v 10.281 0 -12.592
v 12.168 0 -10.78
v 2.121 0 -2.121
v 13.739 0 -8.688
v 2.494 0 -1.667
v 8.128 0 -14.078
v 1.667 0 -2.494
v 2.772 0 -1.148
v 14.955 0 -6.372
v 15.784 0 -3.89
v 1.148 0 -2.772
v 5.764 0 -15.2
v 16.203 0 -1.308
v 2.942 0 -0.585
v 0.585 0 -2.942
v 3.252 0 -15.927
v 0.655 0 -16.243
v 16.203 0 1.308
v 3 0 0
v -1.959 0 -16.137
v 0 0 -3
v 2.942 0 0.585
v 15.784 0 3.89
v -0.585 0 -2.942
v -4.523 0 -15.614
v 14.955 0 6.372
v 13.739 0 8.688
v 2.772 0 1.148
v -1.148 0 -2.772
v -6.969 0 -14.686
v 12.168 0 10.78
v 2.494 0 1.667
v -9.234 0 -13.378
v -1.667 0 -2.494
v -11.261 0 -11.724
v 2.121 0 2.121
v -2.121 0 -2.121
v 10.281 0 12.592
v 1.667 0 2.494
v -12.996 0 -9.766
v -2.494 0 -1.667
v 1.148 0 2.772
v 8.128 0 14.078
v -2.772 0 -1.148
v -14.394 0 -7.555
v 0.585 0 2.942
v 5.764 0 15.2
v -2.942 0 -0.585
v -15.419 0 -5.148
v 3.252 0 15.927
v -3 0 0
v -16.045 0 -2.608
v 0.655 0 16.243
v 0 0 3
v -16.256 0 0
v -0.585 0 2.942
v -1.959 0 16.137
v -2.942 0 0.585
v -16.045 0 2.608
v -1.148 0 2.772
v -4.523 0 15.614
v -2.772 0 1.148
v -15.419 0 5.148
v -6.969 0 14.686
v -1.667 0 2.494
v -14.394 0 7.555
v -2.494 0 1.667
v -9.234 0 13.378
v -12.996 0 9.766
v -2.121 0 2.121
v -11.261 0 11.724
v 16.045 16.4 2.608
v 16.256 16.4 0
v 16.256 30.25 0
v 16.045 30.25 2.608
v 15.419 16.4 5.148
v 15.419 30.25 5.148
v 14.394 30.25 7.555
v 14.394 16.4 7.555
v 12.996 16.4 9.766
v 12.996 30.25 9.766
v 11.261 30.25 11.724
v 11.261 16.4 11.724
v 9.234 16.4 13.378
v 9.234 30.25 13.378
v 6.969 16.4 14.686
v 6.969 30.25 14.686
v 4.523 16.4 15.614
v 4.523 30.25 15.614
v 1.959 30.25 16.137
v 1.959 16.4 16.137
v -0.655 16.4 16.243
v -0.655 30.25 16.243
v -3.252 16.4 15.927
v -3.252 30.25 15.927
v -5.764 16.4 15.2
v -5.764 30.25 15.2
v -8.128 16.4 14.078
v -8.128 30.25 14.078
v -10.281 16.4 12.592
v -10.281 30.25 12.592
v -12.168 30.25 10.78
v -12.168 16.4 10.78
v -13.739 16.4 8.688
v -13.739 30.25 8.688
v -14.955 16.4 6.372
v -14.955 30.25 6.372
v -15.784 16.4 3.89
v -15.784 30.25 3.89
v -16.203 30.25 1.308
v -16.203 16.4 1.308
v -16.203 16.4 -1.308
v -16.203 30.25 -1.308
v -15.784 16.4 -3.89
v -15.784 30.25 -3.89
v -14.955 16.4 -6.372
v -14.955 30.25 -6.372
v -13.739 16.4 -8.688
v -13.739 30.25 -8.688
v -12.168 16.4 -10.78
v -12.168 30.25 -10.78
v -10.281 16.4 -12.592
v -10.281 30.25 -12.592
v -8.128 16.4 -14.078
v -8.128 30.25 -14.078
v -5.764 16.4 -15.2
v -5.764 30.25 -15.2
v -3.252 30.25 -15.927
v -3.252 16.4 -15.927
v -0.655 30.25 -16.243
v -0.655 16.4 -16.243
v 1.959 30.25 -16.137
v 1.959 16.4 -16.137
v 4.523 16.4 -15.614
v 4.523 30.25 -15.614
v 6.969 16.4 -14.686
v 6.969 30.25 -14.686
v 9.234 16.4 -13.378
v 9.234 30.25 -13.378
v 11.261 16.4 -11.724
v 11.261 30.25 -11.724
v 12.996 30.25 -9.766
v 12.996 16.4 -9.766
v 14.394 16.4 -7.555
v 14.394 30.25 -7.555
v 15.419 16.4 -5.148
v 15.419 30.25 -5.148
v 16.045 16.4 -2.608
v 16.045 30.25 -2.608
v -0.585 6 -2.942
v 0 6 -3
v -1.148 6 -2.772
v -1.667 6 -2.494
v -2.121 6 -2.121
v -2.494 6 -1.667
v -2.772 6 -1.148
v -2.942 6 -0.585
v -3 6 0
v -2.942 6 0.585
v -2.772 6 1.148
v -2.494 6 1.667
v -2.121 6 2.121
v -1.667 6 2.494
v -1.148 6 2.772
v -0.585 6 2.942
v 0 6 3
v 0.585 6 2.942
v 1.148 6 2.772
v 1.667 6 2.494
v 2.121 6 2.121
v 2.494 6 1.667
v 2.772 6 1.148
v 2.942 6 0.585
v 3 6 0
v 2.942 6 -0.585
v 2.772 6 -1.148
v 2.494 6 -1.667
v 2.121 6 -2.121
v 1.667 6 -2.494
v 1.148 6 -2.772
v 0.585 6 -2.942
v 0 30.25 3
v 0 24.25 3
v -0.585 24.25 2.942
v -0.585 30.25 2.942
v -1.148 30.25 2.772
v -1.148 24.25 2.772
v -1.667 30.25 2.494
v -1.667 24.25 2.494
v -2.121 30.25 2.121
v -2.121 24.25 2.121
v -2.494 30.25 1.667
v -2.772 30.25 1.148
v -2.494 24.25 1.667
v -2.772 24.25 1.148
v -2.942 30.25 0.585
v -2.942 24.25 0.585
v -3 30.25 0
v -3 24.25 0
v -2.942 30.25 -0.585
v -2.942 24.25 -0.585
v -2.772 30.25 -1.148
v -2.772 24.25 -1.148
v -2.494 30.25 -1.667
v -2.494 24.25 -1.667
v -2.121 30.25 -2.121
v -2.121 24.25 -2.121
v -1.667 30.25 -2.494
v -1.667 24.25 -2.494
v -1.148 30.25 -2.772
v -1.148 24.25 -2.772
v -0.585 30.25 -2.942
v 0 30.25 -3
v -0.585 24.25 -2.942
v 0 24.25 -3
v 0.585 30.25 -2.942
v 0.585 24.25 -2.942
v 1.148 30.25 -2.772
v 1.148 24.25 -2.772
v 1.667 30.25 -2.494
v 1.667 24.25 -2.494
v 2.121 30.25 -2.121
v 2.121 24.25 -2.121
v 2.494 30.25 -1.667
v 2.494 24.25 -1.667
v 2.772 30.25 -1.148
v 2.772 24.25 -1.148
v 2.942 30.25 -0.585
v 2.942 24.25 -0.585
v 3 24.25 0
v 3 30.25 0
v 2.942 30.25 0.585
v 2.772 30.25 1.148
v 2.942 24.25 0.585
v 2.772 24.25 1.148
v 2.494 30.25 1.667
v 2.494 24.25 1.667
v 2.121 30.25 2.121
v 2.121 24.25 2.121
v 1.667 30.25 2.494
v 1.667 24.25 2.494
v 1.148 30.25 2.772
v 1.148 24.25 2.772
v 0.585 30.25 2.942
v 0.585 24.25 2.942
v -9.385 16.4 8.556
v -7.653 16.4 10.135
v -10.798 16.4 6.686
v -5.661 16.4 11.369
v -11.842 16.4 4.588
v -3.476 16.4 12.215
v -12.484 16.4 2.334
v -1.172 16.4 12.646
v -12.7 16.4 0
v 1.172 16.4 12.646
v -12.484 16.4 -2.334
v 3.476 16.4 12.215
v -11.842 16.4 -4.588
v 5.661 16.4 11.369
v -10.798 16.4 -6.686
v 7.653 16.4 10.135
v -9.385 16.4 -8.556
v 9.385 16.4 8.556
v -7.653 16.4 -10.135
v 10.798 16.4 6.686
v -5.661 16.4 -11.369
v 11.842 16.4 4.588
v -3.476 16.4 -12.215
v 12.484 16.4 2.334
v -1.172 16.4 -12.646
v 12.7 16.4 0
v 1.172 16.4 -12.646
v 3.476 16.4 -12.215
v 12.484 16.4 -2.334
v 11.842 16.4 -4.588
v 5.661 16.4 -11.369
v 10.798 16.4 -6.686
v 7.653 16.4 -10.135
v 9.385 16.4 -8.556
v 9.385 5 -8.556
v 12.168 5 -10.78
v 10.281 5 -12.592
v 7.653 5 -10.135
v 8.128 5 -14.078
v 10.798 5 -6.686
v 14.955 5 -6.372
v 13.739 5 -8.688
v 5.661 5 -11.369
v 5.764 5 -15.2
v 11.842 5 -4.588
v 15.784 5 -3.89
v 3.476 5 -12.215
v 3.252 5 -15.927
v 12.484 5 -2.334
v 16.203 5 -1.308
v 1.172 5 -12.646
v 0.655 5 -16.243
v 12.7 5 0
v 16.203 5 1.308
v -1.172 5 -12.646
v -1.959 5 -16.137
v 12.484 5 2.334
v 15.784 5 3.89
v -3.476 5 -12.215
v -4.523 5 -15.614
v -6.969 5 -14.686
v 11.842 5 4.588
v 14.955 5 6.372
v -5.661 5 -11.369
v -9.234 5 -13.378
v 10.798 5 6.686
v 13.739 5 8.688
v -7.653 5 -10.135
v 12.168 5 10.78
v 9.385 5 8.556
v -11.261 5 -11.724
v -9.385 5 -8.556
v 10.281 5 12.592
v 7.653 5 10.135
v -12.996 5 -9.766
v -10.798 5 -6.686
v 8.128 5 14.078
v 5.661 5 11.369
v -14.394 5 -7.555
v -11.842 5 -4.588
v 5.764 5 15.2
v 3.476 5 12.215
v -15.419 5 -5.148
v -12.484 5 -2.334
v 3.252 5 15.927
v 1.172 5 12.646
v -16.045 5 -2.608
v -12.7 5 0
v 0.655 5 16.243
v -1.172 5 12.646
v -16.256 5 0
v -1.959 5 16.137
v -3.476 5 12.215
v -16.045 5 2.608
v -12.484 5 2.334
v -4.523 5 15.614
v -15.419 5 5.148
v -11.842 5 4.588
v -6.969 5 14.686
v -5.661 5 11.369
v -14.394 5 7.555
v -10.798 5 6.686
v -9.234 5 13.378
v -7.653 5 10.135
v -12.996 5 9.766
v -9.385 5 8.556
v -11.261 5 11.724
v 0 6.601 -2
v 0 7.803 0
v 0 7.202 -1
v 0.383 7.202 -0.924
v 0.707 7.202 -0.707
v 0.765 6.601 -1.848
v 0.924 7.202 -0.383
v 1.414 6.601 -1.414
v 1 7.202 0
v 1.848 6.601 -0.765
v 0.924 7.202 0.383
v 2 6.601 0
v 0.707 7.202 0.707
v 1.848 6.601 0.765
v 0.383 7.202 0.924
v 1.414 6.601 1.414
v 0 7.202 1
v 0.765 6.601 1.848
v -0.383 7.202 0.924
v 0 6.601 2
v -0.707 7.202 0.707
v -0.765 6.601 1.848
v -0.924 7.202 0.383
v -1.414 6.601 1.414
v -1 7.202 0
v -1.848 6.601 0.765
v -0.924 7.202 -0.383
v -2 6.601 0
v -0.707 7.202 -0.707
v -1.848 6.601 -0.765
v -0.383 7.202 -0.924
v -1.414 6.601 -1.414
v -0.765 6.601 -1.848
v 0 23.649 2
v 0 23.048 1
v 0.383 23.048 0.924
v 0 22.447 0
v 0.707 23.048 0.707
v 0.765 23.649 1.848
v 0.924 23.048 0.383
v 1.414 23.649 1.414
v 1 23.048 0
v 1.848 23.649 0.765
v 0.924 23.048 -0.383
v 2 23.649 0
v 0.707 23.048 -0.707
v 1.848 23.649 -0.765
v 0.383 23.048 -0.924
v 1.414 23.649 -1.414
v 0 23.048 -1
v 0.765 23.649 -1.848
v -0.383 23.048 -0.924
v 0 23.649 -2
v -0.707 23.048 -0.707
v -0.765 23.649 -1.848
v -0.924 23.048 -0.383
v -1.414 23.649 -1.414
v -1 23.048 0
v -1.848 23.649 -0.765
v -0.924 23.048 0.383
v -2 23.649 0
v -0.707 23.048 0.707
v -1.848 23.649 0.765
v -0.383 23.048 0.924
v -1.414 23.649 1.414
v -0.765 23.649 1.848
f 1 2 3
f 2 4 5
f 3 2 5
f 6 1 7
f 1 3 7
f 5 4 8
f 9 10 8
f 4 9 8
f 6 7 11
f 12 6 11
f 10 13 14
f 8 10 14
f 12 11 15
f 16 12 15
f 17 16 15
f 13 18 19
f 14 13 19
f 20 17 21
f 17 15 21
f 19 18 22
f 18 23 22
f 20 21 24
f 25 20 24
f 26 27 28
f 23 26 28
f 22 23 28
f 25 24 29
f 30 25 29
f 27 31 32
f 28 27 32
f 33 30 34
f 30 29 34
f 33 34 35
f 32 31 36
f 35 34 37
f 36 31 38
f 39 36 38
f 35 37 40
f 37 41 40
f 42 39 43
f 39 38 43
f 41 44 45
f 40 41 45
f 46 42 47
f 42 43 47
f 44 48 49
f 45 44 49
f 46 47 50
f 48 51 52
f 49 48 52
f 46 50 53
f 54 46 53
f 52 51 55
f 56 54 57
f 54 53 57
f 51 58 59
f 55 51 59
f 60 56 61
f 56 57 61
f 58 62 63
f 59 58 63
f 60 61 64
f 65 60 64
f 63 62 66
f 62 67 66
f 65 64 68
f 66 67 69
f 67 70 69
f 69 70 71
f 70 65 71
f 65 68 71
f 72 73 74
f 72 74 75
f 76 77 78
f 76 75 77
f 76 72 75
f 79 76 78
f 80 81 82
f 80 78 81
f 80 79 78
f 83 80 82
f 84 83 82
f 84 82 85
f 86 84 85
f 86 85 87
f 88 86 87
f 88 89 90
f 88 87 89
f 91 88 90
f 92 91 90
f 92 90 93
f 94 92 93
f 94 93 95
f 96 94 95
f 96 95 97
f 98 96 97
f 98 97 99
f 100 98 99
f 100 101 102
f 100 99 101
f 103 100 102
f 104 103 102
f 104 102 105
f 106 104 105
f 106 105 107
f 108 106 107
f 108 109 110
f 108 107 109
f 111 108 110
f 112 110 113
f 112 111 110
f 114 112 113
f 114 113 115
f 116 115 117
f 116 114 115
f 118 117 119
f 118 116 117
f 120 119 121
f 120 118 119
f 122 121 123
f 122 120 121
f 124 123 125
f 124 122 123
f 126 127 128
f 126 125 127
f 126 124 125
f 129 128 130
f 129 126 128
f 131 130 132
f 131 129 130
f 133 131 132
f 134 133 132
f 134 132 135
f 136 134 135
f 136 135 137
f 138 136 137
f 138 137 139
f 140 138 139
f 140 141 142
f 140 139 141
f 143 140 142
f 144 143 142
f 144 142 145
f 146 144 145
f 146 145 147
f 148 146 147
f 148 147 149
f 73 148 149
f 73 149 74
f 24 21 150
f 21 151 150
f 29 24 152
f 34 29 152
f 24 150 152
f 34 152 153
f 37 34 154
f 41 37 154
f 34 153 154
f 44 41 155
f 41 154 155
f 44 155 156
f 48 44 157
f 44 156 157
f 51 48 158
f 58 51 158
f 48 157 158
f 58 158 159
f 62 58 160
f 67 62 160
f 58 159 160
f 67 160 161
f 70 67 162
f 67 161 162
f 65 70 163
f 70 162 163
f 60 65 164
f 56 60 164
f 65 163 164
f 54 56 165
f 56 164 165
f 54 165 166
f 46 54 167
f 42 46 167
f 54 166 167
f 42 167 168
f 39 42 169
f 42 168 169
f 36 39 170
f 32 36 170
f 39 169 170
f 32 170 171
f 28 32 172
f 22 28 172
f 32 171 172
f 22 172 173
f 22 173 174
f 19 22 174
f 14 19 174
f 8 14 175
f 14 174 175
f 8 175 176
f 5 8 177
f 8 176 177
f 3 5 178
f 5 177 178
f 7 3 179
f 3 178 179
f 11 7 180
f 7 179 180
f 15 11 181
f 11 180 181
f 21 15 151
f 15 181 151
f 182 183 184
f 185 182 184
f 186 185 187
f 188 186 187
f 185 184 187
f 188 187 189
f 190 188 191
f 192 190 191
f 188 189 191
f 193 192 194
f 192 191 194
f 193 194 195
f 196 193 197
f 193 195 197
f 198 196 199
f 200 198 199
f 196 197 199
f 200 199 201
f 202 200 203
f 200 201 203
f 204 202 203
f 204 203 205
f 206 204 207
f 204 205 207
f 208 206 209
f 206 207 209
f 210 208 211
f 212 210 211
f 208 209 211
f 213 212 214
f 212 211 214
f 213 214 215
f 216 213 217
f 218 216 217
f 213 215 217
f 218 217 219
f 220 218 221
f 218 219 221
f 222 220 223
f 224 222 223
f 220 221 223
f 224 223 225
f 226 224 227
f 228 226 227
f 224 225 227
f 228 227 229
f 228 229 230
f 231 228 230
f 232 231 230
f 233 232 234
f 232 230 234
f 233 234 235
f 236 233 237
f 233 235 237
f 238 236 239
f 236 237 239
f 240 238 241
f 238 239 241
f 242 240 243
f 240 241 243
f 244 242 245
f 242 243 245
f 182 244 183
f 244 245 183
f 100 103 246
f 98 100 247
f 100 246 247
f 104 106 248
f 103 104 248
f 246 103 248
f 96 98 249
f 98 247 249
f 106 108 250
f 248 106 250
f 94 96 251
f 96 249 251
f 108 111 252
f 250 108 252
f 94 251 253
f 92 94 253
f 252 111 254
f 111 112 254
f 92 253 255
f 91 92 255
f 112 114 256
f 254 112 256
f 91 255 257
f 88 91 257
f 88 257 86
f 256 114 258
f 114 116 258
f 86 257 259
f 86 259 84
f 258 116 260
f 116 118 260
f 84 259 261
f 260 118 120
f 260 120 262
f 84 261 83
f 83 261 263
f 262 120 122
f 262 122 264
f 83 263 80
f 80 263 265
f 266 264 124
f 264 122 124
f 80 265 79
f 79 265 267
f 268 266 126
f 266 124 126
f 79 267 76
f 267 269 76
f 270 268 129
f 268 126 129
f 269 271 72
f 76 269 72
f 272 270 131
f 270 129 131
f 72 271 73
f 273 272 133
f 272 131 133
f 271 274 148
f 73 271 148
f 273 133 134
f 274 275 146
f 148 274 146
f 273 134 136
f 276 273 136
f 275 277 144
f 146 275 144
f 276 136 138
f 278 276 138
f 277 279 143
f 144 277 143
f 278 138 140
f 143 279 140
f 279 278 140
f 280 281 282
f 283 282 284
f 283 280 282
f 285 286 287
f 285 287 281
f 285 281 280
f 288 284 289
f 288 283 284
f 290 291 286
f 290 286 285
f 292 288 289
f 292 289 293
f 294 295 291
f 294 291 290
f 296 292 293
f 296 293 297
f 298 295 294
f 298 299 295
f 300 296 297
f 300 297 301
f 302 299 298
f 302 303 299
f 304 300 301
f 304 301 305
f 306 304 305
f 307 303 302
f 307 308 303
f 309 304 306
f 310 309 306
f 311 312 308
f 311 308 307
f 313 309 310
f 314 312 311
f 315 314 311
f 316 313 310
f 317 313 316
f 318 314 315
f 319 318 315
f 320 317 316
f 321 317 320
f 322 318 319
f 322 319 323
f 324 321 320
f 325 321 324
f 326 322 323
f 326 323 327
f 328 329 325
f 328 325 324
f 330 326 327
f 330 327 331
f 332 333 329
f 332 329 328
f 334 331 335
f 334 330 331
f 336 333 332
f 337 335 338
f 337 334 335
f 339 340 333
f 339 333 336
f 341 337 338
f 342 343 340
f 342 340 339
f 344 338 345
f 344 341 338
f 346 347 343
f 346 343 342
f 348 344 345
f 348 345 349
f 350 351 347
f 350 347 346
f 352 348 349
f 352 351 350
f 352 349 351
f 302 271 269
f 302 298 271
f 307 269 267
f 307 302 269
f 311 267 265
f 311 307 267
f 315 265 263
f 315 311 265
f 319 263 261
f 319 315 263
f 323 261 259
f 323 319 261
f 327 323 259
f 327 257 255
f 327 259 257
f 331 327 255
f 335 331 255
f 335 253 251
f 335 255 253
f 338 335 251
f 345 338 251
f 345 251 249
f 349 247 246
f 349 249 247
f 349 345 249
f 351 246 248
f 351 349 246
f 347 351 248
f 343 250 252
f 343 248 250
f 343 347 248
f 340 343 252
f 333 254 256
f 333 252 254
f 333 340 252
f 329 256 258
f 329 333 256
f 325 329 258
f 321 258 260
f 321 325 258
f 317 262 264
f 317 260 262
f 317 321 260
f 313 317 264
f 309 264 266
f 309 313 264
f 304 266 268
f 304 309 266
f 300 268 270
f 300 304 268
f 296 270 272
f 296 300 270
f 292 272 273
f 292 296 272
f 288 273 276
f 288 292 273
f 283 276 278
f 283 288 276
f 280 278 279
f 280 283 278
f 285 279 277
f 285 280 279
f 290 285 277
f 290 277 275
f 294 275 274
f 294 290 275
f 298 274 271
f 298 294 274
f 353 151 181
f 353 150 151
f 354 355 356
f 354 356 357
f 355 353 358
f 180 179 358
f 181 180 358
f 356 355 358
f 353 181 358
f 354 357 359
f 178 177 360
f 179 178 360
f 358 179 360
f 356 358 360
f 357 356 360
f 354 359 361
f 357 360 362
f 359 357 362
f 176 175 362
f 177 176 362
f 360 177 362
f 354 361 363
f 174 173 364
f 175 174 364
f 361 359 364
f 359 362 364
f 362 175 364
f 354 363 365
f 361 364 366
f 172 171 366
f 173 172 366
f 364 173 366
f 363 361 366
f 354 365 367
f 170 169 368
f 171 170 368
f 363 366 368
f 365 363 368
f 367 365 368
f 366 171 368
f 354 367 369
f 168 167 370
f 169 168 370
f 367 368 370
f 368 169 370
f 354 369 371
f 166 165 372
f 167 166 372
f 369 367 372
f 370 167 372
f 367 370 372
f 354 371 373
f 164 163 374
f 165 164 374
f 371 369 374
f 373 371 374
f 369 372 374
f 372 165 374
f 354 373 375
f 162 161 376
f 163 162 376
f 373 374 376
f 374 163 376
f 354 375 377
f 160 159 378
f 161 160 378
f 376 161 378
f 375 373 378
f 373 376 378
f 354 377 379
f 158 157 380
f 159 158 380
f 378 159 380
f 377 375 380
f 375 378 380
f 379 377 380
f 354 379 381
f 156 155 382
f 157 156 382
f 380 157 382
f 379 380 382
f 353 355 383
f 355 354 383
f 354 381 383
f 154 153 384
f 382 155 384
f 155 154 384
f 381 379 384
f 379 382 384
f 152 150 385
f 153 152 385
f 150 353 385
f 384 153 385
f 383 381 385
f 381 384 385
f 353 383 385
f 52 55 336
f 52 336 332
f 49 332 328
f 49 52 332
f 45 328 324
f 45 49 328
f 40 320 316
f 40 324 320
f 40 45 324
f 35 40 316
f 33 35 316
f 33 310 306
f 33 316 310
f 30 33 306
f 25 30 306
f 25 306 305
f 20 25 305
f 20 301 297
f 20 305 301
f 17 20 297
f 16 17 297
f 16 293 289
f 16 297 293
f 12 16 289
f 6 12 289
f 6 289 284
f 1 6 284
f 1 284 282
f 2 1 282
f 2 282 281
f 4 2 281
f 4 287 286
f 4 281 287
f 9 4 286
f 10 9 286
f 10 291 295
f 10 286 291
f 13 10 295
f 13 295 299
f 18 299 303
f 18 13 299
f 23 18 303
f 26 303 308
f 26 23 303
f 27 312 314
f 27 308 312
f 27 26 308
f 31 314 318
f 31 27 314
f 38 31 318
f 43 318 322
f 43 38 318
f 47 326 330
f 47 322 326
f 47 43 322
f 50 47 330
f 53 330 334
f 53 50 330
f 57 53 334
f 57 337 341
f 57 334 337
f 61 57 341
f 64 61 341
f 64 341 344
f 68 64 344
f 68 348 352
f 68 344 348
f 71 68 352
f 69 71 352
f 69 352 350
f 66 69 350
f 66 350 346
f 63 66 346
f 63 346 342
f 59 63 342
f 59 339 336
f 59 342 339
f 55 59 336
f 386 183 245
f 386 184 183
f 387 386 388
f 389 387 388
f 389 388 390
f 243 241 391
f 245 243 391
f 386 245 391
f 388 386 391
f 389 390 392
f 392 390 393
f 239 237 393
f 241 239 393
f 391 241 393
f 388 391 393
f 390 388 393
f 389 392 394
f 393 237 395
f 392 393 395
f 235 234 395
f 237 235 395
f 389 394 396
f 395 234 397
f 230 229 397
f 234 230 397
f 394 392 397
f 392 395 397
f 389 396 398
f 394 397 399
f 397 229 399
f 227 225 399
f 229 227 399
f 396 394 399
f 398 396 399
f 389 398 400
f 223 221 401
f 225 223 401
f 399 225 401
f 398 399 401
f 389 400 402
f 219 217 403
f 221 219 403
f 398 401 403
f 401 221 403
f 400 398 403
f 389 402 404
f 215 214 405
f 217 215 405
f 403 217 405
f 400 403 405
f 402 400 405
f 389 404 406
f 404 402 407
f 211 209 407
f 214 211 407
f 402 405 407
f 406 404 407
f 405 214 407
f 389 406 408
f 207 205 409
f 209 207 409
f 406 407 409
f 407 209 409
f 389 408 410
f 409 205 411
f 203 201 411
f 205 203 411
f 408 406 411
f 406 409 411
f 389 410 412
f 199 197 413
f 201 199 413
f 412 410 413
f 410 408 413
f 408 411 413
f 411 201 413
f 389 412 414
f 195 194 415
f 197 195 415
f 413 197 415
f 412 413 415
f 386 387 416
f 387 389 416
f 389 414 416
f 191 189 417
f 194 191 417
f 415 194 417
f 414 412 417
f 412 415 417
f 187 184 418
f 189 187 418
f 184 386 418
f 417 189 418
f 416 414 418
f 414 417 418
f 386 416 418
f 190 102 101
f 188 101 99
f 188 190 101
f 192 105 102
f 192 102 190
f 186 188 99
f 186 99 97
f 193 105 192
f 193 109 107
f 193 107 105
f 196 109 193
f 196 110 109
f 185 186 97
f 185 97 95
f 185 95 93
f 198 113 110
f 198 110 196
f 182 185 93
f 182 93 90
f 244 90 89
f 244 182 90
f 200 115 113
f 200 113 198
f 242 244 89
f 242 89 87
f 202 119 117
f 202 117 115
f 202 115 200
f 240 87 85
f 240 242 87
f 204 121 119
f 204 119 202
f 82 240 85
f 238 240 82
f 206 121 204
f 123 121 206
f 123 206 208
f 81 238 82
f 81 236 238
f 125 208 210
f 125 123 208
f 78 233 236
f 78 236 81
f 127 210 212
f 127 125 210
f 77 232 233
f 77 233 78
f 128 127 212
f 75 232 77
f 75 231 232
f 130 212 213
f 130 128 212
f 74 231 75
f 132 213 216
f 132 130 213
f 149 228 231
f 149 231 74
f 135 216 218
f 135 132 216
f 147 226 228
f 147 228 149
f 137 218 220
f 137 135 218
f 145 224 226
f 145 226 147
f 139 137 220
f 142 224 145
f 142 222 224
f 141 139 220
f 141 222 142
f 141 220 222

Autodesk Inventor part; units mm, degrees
ref_plane "YZ Plane" through (0, 0, 0) normal (1, 0, 0) x (0, 1, 0)
ref_plane "XZ Plane" through (0, 0, 0) normal (0, 1, 0) x (-1, 0, 0)
ref_plane "XY Plane" through (0, 0, 0) normal (0, 0, 1) x (1, 0, 0)
sketch "Sketch1" plane through (0, 0, 0) normal (0, 1, 0) x (-1, 0, 0)
  circle A0 centre (0, 0) radius 16.256
  dimension "d0" = 32.512
extrude "Extrusion1" add sketch "Sketch1" along normal blind 5
sketch "Sketch11" plane through (0, 5, 0) normal (0, 1, 0) x (1, 0, 0)
  circle A0 centre (0, 0) radius 12.7
  dimension "d38" = 25.4
extrude "Extrusion6" add sketch "Sketch11" along normal blind 11.4
sketch "Sketch12" plane through (0, 16.4, 0) normal (0, 1, 0) x (1, 0, 0)
  circle A0 centre (0, 0) radius 16.256
  dimension "d41" = 32.512
extrude "Extrusion7" add sketch "Sketch12" along normal blind 13.85
sketch "Sketch13" plane through (0, 30.25, 0) normal (0, 1, 0) x (1, 0, 0)
  point P0 (0, 0)
  point P1 (0, 0)
hole "Hole2" at (0, 30.25, 0) direction (0, -1, 0) diameter 6 depth 6 tip angle 118
thread "Thread3" size "1/4-20 UNC" class "2B" standard "ANSI Unified Screw Threads" full length
sketch "Sketch14" plane through (0, 0, 0) normal (0, -1, 0) x (1, 0, 0)
  circle A0 centre (0, 0) radius 3 projected
hole "Hole3" at (0, 0, 0) direction (0, 1, 0) diameter 6 depth 6 tip angle 118
thread "Thread4" size "1/4-20 UNC" class "2B" standard "ANSI Unified Screw Threads" full length
properties part number "POSTE_ESPEJO"
